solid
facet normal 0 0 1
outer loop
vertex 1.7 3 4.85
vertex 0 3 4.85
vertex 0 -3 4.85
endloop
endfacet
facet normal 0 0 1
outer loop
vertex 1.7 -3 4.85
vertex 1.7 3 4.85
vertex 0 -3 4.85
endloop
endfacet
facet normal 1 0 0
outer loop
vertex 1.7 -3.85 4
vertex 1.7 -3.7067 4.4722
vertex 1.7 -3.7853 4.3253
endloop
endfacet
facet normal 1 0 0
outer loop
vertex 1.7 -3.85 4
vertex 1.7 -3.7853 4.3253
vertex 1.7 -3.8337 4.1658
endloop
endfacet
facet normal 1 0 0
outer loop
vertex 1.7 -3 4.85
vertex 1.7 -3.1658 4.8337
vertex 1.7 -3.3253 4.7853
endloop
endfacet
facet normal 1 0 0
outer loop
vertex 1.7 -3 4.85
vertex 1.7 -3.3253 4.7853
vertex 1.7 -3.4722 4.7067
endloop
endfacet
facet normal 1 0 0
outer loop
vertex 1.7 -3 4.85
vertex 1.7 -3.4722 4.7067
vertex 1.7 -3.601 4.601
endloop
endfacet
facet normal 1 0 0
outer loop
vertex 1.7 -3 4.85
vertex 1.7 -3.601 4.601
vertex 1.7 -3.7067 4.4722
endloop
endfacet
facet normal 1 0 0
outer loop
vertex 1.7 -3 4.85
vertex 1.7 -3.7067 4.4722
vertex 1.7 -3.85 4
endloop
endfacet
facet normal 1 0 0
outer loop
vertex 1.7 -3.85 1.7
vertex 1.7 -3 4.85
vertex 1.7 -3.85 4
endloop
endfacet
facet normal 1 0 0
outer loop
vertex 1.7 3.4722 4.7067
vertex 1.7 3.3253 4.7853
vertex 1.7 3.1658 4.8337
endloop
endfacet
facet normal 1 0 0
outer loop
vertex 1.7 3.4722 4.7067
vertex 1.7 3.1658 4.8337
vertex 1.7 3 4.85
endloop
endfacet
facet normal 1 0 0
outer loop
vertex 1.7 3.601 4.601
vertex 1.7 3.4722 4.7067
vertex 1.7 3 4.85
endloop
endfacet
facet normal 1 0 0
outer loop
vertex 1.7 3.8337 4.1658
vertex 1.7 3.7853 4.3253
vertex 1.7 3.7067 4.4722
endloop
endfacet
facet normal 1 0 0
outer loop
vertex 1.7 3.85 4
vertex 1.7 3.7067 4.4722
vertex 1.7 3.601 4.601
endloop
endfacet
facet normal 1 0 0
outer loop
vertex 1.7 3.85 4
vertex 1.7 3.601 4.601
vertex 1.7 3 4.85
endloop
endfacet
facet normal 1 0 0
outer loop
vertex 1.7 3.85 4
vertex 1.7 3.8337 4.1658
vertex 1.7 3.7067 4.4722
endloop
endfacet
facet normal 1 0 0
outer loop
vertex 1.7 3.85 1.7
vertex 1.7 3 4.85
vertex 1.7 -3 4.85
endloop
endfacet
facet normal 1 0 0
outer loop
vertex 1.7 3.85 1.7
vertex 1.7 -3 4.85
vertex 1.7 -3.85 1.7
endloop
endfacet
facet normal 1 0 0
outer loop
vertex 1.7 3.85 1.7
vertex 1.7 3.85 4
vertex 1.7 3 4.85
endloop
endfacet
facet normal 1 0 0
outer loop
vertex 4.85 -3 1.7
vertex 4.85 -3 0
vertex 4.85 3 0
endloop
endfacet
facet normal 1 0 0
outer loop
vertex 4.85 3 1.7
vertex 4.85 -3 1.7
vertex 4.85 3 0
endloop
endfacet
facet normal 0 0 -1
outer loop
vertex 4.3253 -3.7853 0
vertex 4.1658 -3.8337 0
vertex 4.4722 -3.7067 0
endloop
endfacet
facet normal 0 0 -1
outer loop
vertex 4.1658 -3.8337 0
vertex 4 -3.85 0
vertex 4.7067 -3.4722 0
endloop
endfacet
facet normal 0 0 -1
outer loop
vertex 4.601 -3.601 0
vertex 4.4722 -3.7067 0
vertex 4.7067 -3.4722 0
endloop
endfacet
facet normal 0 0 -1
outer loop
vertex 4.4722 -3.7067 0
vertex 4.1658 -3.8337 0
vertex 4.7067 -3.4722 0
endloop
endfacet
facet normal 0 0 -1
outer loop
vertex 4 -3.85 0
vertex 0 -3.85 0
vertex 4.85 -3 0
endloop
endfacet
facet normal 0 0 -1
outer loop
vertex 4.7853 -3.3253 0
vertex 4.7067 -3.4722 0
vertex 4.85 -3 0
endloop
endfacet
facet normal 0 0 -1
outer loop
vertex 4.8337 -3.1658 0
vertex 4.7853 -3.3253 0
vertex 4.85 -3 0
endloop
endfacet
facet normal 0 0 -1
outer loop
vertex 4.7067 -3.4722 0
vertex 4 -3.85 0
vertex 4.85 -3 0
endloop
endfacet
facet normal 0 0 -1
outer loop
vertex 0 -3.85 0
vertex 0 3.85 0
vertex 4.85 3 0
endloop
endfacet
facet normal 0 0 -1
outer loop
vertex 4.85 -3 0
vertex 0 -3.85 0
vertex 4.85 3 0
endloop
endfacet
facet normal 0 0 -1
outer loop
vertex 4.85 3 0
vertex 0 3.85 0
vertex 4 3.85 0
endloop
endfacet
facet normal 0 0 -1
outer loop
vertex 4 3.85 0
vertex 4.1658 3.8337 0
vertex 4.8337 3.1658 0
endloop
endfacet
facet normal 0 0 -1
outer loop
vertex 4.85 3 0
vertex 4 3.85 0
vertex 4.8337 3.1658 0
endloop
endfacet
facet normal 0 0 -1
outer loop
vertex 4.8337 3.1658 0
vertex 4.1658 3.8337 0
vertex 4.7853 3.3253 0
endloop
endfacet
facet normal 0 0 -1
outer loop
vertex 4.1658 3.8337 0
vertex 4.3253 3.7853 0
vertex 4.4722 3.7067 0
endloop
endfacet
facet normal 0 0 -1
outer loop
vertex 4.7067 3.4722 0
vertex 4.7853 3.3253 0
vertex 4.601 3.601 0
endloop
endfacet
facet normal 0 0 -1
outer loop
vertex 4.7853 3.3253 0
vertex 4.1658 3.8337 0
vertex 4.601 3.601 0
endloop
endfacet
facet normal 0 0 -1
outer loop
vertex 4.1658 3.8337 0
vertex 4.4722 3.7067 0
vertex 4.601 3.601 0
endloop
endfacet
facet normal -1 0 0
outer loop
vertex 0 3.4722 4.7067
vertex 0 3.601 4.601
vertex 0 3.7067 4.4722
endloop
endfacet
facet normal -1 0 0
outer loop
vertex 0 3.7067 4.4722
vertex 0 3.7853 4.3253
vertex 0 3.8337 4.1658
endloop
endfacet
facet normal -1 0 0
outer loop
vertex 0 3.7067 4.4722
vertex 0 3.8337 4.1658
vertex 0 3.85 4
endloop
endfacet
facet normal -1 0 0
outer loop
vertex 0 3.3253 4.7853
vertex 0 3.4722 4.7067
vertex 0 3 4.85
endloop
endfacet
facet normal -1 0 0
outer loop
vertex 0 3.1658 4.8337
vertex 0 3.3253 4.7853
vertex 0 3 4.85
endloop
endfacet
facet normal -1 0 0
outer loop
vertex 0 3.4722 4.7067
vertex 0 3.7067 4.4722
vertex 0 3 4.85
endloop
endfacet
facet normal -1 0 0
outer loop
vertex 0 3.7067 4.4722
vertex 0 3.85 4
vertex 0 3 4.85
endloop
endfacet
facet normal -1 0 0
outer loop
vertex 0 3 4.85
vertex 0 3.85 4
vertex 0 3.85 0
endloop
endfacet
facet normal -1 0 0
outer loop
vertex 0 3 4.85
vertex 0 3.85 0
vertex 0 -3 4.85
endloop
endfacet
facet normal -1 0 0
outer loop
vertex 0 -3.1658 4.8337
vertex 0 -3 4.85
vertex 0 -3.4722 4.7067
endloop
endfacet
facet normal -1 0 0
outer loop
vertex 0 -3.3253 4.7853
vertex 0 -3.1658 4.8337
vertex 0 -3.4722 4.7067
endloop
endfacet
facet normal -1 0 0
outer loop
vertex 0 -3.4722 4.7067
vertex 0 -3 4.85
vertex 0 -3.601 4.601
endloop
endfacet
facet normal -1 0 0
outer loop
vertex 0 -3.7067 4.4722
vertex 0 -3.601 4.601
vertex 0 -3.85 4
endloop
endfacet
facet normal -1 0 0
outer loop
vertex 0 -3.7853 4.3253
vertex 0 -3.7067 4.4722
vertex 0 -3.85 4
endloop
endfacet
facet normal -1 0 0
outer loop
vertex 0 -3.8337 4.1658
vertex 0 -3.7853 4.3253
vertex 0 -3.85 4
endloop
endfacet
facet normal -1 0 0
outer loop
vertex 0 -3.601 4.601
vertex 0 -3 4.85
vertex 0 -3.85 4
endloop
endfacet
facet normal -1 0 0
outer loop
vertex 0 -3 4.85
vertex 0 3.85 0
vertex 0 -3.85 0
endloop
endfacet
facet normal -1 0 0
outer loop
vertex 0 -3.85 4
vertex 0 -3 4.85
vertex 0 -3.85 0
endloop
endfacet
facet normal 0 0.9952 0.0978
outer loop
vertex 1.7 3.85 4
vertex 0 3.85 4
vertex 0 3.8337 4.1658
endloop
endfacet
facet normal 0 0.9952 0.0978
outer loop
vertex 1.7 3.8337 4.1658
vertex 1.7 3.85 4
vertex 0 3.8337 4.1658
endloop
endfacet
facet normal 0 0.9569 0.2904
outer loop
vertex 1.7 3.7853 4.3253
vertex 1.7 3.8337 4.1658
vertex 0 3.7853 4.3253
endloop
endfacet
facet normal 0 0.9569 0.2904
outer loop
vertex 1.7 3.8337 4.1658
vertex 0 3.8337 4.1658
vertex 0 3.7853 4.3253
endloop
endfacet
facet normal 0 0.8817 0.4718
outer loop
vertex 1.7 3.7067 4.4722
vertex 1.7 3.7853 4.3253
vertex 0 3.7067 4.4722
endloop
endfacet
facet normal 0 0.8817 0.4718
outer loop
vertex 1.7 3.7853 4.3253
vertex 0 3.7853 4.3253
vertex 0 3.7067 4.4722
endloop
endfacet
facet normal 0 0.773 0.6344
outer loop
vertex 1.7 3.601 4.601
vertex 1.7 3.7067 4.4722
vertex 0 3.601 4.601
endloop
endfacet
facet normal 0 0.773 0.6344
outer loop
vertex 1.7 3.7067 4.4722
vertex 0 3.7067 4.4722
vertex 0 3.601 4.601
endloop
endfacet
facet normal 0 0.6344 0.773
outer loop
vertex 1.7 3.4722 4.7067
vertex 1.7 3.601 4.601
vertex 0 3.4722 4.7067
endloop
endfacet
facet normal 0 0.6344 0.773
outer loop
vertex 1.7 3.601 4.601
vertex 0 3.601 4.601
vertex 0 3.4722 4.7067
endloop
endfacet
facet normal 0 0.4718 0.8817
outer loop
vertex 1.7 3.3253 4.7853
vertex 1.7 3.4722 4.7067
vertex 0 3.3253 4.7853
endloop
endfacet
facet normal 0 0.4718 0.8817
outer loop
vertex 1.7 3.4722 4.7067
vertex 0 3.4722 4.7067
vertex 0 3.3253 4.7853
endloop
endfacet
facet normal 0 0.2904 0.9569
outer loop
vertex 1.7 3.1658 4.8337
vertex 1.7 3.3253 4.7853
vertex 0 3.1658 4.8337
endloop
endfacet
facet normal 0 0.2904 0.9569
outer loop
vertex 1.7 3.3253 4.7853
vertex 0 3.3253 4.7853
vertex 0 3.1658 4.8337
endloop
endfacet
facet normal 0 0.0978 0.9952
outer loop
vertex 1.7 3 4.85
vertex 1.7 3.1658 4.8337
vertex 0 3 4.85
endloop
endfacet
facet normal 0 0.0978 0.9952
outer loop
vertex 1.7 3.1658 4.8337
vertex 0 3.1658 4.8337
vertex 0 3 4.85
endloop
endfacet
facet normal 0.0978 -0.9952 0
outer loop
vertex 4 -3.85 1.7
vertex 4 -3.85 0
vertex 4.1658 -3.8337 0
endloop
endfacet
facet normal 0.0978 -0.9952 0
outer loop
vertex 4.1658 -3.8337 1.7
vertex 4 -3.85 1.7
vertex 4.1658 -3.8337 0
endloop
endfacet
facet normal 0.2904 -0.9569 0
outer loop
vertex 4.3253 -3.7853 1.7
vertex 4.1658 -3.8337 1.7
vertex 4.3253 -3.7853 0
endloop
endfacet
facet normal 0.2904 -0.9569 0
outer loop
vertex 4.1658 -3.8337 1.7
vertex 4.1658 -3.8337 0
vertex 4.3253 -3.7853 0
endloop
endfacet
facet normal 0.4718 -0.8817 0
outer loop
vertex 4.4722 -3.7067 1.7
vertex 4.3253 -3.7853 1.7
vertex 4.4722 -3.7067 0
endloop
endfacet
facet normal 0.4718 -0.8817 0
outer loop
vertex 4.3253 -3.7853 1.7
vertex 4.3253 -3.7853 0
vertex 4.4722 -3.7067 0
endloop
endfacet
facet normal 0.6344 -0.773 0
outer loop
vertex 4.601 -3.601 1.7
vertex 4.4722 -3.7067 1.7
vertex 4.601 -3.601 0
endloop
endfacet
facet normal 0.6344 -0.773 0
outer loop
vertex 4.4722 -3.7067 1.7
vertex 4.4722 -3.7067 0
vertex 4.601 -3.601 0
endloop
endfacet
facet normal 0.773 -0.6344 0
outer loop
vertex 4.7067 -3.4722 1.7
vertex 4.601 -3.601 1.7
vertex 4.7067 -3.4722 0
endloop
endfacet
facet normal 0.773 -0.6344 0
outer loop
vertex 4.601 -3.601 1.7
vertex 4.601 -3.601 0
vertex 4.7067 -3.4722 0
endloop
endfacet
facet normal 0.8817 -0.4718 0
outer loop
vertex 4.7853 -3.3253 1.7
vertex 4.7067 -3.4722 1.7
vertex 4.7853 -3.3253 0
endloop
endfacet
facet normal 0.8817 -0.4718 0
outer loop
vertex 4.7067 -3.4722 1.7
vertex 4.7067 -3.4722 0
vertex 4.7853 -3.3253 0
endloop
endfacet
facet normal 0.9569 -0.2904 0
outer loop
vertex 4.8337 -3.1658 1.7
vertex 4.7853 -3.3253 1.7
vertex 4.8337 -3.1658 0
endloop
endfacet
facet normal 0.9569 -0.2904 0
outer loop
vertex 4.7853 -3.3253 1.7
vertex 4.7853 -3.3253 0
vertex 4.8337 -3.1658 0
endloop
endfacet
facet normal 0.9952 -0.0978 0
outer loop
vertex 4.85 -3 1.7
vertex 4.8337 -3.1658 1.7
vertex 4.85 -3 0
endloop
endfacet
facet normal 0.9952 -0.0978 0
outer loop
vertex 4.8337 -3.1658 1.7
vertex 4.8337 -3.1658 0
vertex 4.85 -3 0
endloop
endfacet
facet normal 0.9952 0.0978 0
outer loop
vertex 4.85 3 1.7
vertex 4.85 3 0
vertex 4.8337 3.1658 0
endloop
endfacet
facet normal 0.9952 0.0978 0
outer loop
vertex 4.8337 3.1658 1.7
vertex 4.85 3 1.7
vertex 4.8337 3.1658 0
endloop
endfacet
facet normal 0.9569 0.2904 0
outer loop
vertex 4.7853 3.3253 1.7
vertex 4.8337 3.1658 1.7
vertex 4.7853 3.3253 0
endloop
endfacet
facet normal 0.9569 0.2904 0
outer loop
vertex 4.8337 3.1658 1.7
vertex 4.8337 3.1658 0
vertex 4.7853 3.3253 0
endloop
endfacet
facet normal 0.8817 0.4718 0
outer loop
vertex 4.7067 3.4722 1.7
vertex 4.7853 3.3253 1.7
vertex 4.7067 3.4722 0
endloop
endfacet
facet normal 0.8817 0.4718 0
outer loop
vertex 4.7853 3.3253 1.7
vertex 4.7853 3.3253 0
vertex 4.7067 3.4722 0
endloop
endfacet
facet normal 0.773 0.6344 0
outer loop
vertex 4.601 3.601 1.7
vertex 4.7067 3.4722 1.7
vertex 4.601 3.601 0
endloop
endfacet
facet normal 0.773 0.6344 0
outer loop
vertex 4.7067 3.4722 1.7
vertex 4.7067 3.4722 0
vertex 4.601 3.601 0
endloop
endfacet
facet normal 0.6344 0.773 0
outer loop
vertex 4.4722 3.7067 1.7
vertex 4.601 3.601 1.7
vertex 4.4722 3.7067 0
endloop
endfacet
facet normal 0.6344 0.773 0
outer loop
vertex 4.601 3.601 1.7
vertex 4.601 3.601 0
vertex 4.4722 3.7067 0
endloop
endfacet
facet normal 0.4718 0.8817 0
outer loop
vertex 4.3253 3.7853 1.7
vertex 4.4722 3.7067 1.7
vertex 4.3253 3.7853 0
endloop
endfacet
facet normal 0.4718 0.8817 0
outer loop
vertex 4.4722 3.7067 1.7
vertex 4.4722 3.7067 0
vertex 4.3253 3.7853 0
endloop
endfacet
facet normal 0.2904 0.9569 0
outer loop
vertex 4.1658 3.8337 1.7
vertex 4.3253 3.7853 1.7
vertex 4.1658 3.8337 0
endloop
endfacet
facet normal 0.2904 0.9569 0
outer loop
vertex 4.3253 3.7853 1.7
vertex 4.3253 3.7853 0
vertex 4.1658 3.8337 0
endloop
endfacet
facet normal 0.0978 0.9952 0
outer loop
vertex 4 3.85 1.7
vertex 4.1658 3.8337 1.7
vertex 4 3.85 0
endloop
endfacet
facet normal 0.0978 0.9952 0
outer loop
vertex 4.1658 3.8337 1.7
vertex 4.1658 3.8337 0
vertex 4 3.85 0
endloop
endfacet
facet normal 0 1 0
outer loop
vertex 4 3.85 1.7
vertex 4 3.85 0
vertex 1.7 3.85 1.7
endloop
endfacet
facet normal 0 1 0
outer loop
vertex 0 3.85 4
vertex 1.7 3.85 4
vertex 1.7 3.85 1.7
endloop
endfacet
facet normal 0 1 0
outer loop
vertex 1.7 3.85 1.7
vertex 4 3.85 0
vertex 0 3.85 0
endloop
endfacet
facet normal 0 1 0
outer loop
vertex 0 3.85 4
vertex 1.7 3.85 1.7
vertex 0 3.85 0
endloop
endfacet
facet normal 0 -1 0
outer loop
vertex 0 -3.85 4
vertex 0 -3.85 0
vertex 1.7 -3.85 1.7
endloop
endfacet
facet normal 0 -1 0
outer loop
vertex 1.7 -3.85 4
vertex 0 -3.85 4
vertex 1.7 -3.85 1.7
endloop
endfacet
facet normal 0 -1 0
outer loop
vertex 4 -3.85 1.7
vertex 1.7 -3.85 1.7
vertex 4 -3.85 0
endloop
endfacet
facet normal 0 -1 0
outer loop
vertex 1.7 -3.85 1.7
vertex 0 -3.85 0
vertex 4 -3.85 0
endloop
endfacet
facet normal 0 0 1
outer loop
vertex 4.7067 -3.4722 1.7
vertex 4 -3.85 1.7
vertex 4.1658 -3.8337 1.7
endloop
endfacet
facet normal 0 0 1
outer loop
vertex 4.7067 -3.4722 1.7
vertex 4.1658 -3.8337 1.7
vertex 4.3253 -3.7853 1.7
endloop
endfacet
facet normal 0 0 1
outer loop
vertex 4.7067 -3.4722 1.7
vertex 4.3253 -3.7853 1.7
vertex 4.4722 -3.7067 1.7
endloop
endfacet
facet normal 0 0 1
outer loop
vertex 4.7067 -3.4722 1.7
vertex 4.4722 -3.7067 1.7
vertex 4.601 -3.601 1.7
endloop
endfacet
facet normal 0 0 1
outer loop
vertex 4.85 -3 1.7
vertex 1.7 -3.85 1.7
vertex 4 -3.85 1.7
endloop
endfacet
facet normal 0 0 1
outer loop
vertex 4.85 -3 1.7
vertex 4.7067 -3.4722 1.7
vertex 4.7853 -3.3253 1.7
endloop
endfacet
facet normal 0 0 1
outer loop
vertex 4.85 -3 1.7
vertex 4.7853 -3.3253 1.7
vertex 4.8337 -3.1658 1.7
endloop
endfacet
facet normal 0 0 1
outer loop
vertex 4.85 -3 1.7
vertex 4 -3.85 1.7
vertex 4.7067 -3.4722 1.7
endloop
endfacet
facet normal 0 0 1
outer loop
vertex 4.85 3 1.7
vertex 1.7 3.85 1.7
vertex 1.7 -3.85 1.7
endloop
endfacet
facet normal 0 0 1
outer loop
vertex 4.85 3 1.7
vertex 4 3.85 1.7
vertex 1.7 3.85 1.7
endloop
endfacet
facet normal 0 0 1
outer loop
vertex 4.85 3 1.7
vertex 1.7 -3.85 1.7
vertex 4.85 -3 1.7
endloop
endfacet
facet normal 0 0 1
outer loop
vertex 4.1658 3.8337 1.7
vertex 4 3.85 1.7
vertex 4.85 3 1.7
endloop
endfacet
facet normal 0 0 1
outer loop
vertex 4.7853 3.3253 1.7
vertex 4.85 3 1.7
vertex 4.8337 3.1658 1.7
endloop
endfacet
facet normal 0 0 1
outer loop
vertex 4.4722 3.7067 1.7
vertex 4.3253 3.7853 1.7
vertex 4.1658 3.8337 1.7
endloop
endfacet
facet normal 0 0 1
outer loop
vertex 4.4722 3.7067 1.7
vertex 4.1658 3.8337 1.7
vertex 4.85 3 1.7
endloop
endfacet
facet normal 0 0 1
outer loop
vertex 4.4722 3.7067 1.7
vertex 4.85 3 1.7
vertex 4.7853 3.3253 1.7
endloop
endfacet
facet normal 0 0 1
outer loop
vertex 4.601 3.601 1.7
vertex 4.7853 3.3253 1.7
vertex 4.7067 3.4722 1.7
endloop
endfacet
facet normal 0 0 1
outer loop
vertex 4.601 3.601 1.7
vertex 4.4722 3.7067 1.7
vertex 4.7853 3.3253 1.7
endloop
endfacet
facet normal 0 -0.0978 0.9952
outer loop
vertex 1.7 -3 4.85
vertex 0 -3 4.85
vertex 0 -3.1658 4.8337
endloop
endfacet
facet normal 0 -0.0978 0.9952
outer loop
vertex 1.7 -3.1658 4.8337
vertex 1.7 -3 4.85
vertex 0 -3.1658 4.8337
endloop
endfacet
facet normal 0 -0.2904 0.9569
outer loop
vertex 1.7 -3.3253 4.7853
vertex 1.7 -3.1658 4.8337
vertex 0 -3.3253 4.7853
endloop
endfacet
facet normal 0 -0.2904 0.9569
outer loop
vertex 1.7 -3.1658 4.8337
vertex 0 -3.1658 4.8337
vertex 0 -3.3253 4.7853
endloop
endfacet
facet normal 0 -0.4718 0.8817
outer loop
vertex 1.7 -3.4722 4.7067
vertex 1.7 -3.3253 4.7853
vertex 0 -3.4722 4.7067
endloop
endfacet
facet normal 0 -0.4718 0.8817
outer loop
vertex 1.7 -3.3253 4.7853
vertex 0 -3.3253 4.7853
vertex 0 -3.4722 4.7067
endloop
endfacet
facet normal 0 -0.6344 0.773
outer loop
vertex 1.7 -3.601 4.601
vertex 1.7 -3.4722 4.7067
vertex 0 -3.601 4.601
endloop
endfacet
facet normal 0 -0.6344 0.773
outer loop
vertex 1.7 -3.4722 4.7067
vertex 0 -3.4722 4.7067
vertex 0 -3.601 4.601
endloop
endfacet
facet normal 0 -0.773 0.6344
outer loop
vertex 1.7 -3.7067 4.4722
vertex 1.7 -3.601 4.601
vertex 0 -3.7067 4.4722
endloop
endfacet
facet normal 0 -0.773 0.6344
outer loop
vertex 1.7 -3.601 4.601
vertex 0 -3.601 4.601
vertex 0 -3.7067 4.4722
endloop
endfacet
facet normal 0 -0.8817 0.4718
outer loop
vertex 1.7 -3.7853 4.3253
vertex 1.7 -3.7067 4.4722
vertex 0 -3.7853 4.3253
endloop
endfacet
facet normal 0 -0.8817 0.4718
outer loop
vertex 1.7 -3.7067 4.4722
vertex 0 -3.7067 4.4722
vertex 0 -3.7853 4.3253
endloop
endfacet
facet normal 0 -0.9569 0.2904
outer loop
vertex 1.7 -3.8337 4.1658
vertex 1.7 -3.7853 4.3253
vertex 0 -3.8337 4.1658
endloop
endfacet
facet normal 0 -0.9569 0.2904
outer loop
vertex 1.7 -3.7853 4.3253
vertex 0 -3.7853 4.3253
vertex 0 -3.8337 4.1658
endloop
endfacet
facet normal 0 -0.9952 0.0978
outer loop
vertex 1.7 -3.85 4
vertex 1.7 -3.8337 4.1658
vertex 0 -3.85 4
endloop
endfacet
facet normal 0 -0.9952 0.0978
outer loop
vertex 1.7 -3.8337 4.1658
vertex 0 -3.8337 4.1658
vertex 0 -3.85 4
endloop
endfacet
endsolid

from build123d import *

# Parameters (mm, degrees)
FLUSH_ROOF_LENS_T1_7_CLEARANCE0_15_DEPTH = 1.7
FLUSH_SIDE_LENS_T1_7_CLEARANCE0_15_DEPTH = 1.7


with BuildPart() as part:
    # 草图1 → Flush_roof_lens_T1.7_clearance0.15 (new body)
    with BuildSketch(Plane.XY):
        with BuildLine():
            Line((0, -3.85), (4, -3.85))
            ThreePointArc((4, -3.85), (4.601040764, -3.601040764), (4.85, -3))
            Line((4.85, -3), (4.85, 3))
            ThreePointArc((4.85, 3), (4.601040764, 3.601040764), (4, 3.85))
            Line((4, 3.85), (0, 3.85))
            Line((0, 3.85), (0, -3.85))
        make_face()
    extrude(amount=FLUSH_ROOF_LENS_T1_7_CLEARANCE0_15_DEPTH)

    # 草图2 → Flush_side_lens_T1.7_clearance0.15 (add)
    with BuildSketch(Plane(origin=(0, 0, 0), x_dir=(0, 0, -1), z_dir=(1, 0, 0))):
        with BuildLine():
            Line((0, -3.85), (0, 3.85))
            Line((0, 3.85), (-4, 3.85))
            ThreePointArc((-4, 3.85), (-4.601040764, 3.601040764), (-4.85, 3))
            Line((-4.85, 3), (-4.85, -3))
            ThreePointArc((-4.85, -3), (-4.601040764, -3.601040764), (-4, -3.85))
            Line((-4, -3.85), (0, -3.85))
        make_face()
    extrude(amount=FLUSH_SIDE_LENS_T1_7_CLEARANCE0_15_DEPTH)


solid = part.part
